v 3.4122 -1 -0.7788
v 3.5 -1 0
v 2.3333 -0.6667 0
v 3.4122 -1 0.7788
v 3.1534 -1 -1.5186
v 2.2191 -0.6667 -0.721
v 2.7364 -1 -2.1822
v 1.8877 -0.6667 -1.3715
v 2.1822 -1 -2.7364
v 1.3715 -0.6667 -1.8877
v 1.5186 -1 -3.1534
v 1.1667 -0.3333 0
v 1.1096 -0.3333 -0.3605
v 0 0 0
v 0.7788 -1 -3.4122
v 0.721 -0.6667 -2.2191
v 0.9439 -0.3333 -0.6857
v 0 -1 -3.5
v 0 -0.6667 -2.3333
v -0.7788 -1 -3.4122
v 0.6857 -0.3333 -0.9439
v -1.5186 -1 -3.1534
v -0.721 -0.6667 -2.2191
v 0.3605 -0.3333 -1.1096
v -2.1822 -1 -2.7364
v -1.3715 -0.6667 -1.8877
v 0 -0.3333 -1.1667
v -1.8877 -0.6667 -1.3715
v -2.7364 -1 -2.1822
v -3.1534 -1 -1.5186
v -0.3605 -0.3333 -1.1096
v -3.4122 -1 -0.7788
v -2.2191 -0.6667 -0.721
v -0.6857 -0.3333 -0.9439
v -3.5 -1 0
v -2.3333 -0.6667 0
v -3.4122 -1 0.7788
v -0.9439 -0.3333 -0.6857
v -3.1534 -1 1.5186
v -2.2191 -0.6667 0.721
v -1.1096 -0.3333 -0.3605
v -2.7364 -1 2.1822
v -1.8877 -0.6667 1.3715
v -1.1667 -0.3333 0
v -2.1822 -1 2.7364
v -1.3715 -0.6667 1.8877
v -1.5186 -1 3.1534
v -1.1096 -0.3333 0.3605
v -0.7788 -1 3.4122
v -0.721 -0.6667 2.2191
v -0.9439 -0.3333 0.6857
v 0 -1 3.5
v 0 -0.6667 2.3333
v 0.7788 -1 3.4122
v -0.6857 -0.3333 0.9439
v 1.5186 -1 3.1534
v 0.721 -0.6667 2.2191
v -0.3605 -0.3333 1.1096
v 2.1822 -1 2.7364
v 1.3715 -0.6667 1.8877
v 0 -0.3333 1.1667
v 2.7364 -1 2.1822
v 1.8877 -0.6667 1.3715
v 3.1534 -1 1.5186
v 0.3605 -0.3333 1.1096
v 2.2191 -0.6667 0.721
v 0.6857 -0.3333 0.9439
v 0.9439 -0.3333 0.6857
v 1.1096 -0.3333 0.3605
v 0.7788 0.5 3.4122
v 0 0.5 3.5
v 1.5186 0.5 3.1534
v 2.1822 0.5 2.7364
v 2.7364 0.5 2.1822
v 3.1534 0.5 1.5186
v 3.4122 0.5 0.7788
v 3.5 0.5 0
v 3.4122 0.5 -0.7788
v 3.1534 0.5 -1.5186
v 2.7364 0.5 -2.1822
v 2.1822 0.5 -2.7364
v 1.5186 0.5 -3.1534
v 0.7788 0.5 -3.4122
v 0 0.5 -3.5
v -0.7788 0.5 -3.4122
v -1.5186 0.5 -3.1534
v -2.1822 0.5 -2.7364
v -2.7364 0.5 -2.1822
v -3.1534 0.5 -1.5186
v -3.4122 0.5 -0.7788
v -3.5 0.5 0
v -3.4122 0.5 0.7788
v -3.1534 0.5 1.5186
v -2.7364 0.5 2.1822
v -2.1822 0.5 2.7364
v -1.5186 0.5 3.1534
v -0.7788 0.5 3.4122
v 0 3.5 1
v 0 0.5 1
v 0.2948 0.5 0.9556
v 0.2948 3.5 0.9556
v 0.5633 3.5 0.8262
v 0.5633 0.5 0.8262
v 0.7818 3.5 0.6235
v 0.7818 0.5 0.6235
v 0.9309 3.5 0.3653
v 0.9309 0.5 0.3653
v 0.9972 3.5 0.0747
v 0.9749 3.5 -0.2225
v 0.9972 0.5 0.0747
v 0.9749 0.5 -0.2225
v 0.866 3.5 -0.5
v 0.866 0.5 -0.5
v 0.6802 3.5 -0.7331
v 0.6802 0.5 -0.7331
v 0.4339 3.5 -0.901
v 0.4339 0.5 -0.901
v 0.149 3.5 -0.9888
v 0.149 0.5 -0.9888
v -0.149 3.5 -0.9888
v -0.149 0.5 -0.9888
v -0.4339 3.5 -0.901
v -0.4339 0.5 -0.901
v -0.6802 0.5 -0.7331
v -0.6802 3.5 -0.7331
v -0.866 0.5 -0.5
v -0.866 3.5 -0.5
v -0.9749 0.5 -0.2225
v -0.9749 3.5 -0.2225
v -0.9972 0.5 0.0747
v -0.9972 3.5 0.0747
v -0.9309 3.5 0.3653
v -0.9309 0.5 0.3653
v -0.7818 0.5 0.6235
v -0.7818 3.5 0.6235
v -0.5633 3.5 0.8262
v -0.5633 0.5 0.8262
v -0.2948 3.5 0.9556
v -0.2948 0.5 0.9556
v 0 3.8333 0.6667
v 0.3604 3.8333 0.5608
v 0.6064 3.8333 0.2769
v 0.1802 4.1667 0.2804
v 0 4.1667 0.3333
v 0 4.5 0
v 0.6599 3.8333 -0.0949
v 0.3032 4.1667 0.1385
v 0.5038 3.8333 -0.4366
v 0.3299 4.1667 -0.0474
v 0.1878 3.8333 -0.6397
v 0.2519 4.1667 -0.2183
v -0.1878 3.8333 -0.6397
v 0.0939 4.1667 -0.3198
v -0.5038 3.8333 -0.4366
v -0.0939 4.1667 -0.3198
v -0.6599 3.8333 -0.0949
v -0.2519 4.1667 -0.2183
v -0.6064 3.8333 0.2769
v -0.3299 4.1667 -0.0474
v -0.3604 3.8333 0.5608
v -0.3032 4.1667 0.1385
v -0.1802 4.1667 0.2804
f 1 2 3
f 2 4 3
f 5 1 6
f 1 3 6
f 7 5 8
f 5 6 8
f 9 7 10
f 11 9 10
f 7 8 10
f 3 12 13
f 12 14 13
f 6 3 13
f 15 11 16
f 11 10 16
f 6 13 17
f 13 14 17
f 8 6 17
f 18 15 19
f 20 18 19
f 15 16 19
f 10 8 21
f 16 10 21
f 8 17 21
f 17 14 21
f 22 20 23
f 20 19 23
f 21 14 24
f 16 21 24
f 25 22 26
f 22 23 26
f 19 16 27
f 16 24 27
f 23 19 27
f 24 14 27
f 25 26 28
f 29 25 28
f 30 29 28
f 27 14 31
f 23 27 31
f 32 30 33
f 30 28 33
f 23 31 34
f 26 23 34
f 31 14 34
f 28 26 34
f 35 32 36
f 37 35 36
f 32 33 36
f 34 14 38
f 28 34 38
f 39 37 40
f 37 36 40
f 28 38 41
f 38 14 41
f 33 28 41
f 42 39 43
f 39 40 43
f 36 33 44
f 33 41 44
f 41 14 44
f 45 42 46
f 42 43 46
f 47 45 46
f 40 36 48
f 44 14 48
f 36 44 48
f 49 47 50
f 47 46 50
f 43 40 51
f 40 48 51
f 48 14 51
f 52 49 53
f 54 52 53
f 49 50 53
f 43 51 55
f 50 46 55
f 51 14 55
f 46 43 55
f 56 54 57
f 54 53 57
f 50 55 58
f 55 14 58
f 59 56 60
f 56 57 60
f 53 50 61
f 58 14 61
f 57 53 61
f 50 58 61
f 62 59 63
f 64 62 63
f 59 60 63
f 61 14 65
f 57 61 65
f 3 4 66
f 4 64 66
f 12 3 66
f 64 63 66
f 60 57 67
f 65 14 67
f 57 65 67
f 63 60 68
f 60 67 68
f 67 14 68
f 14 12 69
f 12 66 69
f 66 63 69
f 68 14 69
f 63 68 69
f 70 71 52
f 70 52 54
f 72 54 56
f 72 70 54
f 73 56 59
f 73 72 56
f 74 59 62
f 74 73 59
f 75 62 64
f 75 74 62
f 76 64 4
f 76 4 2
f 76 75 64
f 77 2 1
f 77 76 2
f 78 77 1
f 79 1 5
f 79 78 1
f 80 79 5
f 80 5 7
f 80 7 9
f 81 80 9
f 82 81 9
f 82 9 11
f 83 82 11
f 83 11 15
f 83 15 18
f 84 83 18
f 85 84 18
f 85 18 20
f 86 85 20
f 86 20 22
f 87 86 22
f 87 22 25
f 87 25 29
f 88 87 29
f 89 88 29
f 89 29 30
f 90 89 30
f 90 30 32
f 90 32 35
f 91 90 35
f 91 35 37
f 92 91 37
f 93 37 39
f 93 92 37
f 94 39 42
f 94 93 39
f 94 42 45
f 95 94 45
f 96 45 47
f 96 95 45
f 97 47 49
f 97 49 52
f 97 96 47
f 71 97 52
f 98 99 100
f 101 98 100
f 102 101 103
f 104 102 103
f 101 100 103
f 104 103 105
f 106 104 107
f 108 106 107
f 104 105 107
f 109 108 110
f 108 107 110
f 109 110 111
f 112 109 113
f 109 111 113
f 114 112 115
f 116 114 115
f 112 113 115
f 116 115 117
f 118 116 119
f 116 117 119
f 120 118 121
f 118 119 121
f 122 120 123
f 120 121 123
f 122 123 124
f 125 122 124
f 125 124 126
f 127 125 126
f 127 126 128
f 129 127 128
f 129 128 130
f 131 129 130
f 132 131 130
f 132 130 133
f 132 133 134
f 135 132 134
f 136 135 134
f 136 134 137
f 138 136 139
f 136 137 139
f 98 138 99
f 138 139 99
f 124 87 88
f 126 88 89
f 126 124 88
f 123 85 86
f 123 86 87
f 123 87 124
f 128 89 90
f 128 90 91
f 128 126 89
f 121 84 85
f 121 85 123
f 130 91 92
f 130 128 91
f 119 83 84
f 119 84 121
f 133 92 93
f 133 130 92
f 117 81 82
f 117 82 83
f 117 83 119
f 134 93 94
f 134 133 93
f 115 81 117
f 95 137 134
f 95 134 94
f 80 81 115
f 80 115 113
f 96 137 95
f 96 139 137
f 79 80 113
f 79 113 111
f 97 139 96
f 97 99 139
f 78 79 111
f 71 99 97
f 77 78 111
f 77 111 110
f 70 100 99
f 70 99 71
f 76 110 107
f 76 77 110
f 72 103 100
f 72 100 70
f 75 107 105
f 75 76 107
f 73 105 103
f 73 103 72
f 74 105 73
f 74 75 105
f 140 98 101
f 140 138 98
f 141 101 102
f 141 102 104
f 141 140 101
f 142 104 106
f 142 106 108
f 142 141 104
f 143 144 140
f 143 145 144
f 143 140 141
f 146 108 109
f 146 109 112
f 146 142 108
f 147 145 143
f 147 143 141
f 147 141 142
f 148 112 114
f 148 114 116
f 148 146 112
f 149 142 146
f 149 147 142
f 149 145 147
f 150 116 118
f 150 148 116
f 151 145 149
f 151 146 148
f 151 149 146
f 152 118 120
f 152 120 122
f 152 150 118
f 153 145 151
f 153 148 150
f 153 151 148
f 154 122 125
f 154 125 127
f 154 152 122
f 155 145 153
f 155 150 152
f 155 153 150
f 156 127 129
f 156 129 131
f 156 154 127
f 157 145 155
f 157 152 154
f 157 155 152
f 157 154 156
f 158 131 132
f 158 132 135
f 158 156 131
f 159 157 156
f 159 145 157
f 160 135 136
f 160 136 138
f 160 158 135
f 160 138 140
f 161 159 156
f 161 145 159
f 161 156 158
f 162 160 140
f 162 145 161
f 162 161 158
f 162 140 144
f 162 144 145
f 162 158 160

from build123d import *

# Parameters (mm, degrees)
BOSS_EXTRUDE1_START = 0.5
SKETCH1_R           = 3.5
BOSS_EXTRUDE1_DEPTH = 1.5
SKETCH5_R           = 1
BOSS_EXTRUDE2_DEPTH = 4
CHAMFER1_SIZE       = 1


# Read off the part's stored shape, not the designer's step: Cut-Loft1
with BuildPart() as part:
    # Sketch1 → Boss-Extrude1 (new body)
    with BuildSketch(Plane(origin=(0, 0, 0), x_dir=(1, 0, 0), z_dir=(0, 1, 0)).offset(BOSS_EXTRUDE1_START)):
        with Locations(Location((0, 0, 0), (0, 0, 270))):
            Circle(SKETCH1_R)
    extrude(amount=-BOSS_EXTRUDE1_DEPTH)

    # Cut-Loft1 outline → Cut-Loft1 (revolve, cut)
    with BuildSketch(Plane.XY):
        Polygon((3.5, -1), (0, 0), (0, -1), align=None)
    revolve(axis=Axis((0, 0, 0), (0, 1, 0)), mode=Mode.SUBTRACT)

    # Sketch5 → Boss-Extrude2 (add)
    with BuildSketch(Plane(origin=(0, 0.5, 0), x_dir=(1, 0, 0), z_dir=(0, 1, 0))):
        with Locations(Location((0, 0, 0), (0, 0, 270))):
            Circle(SKETCH5_R)
    extrude(amount=BOSS_EXTRUDE2_DEPTH)

    # Chamfer1
    chamfer1_edges = [part.edges().sort_by_distance(p)[0] for p in [
        (0, 4.5, -1),
    ]]
    chamfer(chamfer1_edges, length=CHAMFER1_SIZE)


solid = part.part
